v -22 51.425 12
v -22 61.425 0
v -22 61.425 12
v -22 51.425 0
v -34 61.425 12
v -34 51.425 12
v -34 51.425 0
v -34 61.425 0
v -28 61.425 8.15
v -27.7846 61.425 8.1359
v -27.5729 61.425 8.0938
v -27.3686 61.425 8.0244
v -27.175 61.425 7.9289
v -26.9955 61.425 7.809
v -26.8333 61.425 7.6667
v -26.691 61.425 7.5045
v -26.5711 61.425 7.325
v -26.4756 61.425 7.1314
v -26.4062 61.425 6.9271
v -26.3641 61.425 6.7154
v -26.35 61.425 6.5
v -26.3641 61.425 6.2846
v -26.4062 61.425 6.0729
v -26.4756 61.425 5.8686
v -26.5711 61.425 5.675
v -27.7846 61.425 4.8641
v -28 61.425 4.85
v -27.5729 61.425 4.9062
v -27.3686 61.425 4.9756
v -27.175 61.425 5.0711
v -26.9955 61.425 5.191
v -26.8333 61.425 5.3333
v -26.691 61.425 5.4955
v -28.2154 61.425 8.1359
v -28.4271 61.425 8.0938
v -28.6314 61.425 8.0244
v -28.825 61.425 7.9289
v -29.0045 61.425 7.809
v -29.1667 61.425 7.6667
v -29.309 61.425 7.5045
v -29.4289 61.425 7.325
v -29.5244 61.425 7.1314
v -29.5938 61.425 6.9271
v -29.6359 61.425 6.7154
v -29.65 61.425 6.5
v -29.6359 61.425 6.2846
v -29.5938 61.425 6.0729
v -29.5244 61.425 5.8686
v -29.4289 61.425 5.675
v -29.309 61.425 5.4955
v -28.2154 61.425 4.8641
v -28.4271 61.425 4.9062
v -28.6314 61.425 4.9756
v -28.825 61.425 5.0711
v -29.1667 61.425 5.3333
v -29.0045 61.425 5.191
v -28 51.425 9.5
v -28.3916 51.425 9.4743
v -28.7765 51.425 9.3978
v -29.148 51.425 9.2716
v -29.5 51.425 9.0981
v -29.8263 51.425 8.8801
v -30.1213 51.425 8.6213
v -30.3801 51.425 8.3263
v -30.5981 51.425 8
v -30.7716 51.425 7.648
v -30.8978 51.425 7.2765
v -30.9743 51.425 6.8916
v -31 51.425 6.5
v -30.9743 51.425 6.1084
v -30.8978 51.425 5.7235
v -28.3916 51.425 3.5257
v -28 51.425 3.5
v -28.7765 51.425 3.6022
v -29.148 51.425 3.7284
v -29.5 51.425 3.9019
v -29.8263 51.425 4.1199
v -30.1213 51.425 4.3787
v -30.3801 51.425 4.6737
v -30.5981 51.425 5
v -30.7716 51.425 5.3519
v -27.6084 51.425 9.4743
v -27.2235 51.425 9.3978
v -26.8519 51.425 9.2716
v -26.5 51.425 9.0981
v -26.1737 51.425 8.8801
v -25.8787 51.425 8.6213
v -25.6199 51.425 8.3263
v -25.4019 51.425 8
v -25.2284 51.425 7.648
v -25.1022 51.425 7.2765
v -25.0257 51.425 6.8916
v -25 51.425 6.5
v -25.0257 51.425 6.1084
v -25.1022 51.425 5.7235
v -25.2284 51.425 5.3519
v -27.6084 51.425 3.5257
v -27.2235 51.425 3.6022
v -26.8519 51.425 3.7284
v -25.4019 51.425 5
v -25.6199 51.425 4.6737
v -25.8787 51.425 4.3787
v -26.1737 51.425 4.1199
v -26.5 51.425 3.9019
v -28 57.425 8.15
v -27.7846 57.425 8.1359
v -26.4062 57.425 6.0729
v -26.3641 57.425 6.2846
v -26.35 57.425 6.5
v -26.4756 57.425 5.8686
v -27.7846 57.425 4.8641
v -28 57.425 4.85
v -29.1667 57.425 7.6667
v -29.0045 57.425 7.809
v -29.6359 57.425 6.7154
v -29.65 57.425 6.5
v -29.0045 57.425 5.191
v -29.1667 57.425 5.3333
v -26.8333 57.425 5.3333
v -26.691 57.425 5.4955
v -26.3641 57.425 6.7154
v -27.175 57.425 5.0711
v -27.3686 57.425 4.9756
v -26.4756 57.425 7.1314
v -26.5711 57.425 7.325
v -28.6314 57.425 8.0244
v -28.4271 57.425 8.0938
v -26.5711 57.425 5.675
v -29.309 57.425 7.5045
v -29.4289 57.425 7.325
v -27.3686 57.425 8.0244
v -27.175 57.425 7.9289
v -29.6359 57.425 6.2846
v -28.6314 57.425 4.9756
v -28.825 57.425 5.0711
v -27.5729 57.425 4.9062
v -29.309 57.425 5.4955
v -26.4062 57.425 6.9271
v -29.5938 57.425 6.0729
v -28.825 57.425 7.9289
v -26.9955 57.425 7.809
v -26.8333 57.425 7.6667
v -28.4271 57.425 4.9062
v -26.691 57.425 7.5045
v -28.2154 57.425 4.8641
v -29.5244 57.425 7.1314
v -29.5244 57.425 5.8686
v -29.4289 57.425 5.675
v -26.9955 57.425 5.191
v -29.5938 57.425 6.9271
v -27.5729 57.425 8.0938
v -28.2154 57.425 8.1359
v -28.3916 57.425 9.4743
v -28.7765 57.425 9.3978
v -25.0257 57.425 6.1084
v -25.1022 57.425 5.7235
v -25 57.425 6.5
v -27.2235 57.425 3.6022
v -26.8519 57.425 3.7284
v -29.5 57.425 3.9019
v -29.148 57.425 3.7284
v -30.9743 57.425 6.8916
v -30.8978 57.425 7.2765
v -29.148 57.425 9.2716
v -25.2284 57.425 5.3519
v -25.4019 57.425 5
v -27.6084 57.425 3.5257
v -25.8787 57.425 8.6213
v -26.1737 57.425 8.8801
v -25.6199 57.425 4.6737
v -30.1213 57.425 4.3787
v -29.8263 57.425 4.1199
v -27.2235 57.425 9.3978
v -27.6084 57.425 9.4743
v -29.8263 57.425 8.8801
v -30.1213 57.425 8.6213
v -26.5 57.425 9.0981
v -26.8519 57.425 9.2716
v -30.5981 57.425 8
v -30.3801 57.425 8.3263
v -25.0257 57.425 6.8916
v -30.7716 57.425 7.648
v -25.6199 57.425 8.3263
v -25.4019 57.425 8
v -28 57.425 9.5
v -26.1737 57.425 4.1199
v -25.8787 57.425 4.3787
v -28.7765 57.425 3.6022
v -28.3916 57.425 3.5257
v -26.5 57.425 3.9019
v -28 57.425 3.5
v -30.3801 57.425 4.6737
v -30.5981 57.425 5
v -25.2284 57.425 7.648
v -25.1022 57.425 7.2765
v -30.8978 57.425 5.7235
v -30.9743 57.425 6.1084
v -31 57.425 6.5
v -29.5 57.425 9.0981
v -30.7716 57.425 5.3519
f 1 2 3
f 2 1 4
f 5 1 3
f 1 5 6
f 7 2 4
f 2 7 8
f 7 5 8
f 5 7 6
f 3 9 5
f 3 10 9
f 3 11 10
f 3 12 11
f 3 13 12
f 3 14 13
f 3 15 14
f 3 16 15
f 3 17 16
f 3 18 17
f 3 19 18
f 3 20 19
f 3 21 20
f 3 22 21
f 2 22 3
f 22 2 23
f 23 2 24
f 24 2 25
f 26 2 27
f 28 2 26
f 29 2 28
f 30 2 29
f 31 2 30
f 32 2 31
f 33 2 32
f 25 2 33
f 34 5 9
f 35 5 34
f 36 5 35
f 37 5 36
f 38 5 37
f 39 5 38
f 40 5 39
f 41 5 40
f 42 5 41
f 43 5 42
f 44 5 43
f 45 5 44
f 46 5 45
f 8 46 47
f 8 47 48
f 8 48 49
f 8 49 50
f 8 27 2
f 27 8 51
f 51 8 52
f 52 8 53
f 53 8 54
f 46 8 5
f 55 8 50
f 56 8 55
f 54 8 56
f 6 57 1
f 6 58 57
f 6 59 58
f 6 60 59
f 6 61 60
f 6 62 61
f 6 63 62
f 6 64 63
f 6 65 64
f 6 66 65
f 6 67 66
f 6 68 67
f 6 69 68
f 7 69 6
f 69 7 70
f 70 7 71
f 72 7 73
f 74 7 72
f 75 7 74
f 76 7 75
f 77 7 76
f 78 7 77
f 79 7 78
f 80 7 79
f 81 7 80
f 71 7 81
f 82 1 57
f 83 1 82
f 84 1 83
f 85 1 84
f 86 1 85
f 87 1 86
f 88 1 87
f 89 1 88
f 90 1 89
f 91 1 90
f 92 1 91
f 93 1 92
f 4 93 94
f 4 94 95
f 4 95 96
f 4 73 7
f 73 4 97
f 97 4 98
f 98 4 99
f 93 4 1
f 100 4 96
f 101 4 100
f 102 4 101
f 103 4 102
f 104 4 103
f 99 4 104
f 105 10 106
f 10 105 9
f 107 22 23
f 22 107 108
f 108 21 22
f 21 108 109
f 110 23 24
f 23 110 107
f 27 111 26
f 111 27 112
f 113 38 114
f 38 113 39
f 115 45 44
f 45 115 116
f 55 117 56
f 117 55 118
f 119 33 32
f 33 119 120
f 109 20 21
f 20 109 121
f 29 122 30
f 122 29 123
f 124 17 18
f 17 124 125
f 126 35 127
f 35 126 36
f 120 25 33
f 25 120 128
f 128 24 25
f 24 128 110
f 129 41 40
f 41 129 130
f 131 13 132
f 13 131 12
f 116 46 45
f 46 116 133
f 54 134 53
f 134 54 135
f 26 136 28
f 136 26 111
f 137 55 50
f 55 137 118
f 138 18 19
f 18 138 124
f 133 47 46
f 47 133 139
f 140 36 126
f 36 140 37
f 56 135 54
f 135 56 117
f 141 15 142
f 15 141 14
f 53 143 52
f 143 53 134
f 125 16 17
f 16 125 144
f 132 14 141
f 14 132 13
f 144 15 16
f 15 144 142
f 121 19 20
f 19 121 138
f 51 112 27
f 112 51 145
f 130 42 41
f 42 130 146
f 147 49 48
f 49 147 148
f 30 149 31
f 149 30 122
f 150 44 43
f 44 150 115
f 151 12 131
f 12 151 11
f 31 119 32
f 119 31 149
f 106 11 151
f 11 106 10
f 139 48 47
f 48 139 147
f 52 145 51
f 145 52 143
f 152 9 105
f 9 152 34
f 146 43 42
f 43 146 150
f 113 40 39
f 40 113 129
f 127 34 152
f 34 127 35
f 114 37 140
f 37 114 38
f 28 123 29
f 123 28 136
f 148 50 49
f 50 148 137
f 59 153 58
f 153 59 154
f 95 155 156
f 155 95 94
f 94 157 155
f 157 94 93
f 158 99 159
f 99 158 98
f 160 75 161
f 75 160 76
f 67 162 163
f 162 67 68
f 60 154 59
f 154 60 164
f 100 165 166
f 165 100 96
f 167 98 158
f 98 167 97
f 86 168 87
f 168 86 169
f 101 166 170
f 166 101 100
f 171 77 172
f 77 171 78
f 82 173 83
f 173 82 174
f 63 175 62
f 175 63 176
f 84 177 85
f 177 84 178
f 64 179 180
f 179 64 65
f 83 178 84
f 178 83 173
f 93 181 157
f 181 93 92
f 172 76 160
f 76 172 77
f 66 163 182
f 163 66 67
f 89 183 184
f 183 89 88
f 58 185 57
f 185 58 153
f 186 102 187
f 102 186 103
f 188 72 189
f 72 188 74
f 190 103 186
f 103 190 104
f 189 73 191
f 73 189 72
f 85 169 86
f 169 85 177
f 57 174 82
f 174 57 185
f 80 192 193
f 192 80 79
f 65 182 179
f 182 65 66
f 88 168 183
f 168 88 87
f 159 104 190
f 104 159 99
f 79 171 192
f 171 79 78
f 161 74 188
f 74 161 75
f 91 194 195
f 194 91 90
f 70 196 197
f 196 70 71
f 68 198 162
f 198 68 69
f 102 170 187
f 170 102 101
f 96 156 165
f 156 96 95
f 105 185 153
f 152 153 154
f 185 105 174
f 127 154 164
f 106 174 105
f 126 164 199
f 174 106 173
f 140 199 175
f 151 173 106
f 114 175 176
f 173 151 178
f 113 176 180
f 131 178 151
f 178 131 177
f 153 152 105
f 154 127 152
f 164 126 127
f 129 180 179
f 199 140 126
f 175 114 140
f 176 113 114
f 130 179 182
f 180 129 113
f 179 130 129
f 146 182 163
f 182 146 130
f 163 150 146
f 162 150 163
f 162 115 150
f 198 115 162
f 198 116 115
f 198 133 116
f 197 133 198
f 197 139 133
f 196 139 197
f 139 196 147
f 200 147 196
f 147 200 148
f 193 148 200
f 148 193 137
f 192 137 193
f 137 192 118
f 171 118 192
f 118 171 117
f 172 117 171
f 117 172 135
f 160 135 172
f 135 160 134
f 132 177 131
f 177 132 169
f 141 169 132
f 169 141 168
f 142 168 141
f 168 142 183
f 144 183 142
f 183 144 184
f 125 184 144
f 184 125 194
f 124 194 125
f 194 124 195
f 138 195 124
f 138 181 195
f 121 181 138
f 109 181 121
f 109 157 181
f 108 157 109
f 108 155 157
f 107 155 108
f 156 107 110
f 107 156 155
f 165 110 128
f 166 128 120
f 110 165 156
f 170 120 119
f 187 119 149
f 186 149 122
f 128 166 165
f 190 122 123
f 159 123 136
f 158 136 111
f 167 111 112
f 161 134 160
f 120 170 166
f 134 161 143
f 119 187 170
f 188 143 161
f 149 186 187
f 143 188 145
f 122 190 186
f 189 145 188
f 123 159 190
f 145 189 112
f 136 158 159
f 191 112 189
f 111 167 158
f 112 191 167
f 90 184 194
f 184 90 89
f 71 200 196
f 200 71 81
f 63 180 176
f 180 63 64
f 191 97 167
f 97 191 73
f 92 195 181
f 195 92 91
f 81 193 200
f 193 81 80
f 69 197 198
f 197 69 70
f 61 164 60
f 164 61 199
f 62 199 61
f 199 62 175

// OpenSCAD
// file: common.scad
// Small helpers shared by the part files. Include after params.scad.

// An axis-aligned box given by its extents, as task.py's _mm(x0, x1, y0, y1, z0, z1) does.
module box(x0, x1, y0, y1, z0, z1) {
    translate([x0, y0, z0]) cube([x1 - x0, y1 - y0, z1 - z0]);
}

// A round hole or rod along +y from y0 to y1, its axis at (x, z).
module ybore(x, y0, y1, z, d) {
    translate([x, y0, z]) rotate([-90, 0, 0]) cylinder(d = d, h = y1 - y0);
}
// file: params.scad
// Shared dimensions for the printed carrier, sprung rail, guide-rod mounts and SSD dummy (all in mm, grams, N/mm).
//
// Every line is either
//   NAME = value; // task.py: <expression>   a number taken from task.py; check_params.py evaluates <expression>
//                                            against the imported task module (box(BOXES, i) gives a box's
//                                            [x0, x1, y0, y1, z0, z1] in mm) and asserts it equals value
//   NAME = value; // fab: <reason>           a fabrication choice (fit, hardware size); check_params.py checks
//                                            that these are consistent with the task numbers
// Keep one assignment per line and use only numbers, + - * /, names and [ ] lists: check_params.py parses this file.
//
// Frames, as in task.py:
//   carrier: origin on the table under the carrier's centre; x along the carrier, handle bezel toward -x, the drive's
//            connector end (rear) at +x; y across, the sprung rail at +y, the fixed rail at -y; z up.
//   SSD:     origin under the drive's centre on its bottom face; x along it, connector end toward +x; z up.

// ---- the SSD (task.py "the SSD, in its own frame") -----------------------------------------------------------------
SSD_L = 100; // task.py: SSD_L * 1000
SSD_W = 69.85; // task.py: SSD_W * 1000
SSD_H = 7; // task.py: SSD_H * 1000
SSD_MASS_G = 55; // task.py: SSD_MASS * 1000
HALF_W = 34.925; // task.py: HALF_W
HOLE_X = [-36.0, 40.6]; // task.py: HOLE_X
HOLE_Z = 3; // task.py: HOLE_Z
HOLE = 4; // task.py: HOLE
HOLE_DEPTH = 3; // task.py: HOLE_DEPTH
CONN_X = [44, 50]; // task.py: box(SSD_BOXES, 1)[0:2]
CONN_Y = [-31.925, 0]; // task.py: box(SSD_BOXES, 1)[2:4]
LABEL_X = [-42, 30]; // task.py: box(SSD_BOXES, 3)[0:2]
LABEL_Y = [-26, 26]; // task.py: box(SSD_BOXES, 3)[2:4]

// ---- the carrier (task.py "the carrier, in its own frame") ---------------------------------------------------------
CAR_L = 140; // task.py: CAR_L * 1000
CAR_W = 76; // task.py: CAR_W * 1000
CAR_H = 15; // task.py: CAR_H * 1000
CAR_MASS_G = 200; // task.py: CAR_MASS * 1000
SEAT_X = 20; // task.py: SX
SEAT_Z = 4; // task.py: SZ
GAP = 0.5; // task.py: GAP
PIN = 2.5; // task.py: PIN
PIN_IN = 2; // task.py: PIN_IN
RAIL_T = 3; // task.py: RAIL_T
RAIL_IN = 35.425; // task.py: RAIL_IN
RAIL_OUT = 38.425; // task.py: RAIL_OUT
PIN_X = [-16.0, 60.6]; // task.py: PIN_X
PIN_Z = 7; // task.py: PIN_Z
RAIL_SEGS = [[-61, -4], [48, 70]]; // task.py: RAIL_SEGS
RIB_X = [[-25, -10], [50, 65]]; // task.py: RIB_X
RIB_Y_END = 33; // task.py: box(CARRIER_BOXES, 3)[3]
BEZEL_X = [-70, -62]; // task.py: box(CARRIER_BOXES, 0)[0:2]
BEZEL_Y = 38; // task.py: box(CARRIER_BOXES, 0)[3]
HANDLE_X = [-74, -70]; // task.py: box(CARRIER_BOXES, 1)[0:2]
HANDLE_Y = 25; // task.py: box(CARRIER_BOXES, 1)[3]
HANDLE_Z = [3, 12]; // task.py: box(CARRIER_BOXES, 1)[4:6]
FLOOR_X = [-62, -34]; // task.py: box(CARRIER_BOXES, 2)[0:2]
FLOOR_Y = 33; // task.py: box(CARRIER_BOXES, 2)[3]
FLOOR_H = 3; // task.py: box(CARRIER_BOXES, 2)[5]
FIXED_BAR_X = [-70, 70]; // task.py: box(CARRIER_BOXES, 5)[0:2]
FIXED_BAR_H = 3; // task.py: box(CARRIER_BOXES, 5)[5]
FIXED_SEG0_X0 = -62; // task.py: box(CARRIER_BOXES, 6)[0]
RAIL_H = 12; // task.py: box(CARRIER_BOXES, 6)[5]

// ---- the sprung rail (task.py _latch_rail) -------------------------------------------------------------------------
RAIL_Z0 = 1; // task.py: box(rail.boxes, 0)[4]
RAIL_BAR_X = [-61, 70]; // task.py: box(rail.boxes, 2)[0:2]
RAIL_BAR_H = 3; // task.py: box(rail.boxes, 2)[5]
RAIL_TRAVEL = 7; // task.py: RAIL_TRAVEL * 1000
RAIL_RATE = 0.15; // task.py: RAIL_RATE / 1000
RAIL_MASS_G = 30; // task.py: rail.mass * 1000
TAB_X = [-61, -49]; // task.py: TAB_X
TAB_Y = [46.425, 48.925]; // task.py: TAB_Y
TAB_Z = [8, 34]; // task.py: TAB_Z
BRACKET_Z = [8, 12]; // task.py: box(rail.boxes, 3)[4:6]

// ---- print fits (fabrication choices) ------------------------------------------------------------------------------
SLIDE_CLR = 0.3; // fab: diametral clearance of a sliding fit (rod in its mount bore), and the rail's floor clearance
PRESS_CLR = 0; // fab: printed at nominal size for a press fit; horizontal printed holes come out slightly small
POCKET_CLR = 0.3; // fab: clearance round ballast plates and bars in their pockets
$fn = 48; // fab: facets on round holes

// ---- hardware (fabrication choices) --------------------------------------------------------------------------------
PIN_D = 2.5; // fab: 2.5 mm steel dowel pin, as wide as the task's 2.5 mm square pins (0.75 mm clear in a 4 mm hole)
PIN_L = 6; // fab: dowel pin length; PIN_IN + GAP stands proud of the rail, the rest is pressed in
PIN_BOSS = PIN_L - PIN_IN - GAP - RAIL_T; // fab: 0.5 mm pad on the rail's outer face so the pin sits flush there
ROD_D = 3; // fab: 3 mm ground steel rod (silver steel / drill rod / 3 mm linear shaft)
ROD_X = [-28, 52]; // fab: the two guide rods, one in each rail segment, clear of the pins and the pull tab
ROD_Z = 6.5; // fab: rod axis height, mid-height of the rail
BOSS_W = 8; // fab: width (along x) of the rod boss on the sprung rail's outer face
BOSS_L = 6; // fab: how far the rod boss stands out from the rail's outer face
ROD_EMBED = 8; // fab: depth of the blind press-fit bore for the rod in the rail and its boss
MOUNT_W = 12; // fab: guide-rod mount width along x
MOUNT_T = 10; // fab: guide-rod mount length along the rod (the sliding bore's length)
MOUNT_H = 12; // fab: guide-rod mount height
MOUNT_Y0 = RAIL_OUT + BOSS_L + RAIL_TRAVEL; // fab: the boss meets the mount's inner face at full travel (hard stop)
MOUNT_Y1 = MOUNT_Y0 + MOUNT_T; // fab: the mount's outer face
ROD_PROUD = 1; // fab: the rod stands 1 mm out of the mount's outer face with the rail closed
ROD_L = ROD_EMBED + RAIL_TRAVEL + MOUNT_T + ROD_PROUD; // fab: cut length of each guide rod (26 mm)
TONGUE_W = 20; // fab: width of the base web that carries each mount
N_SPRINGS = 2; // fab: one compression spring over each guide rod
SPRING_WIRE = 0.3; // fab: music (spring steel) wire diameter
SPRING_OD = 5; // fab: spring outside diameter (inside 4.4 mm, clear of the 3 mm rod)
SPRING_ACTIVE = 10; // fab: active coils; closed and ground ends add one dead coil at each end
SPRING_POCKET = 6; // fab: depth of the spring pocket in the mount; the spring's length at full travel
SPRING_PRELOAD = 0.5; // fab: compression already in each spring with the rail closed
SPRING_FREE = SPRING_POCKET + RAIL_TRAVEL + SPRING_PRELOAD; // fab: free length (13.5 mm)
SPRING_RATE = RAIL_RATE / N_SPRINGS; // fab: rate of each spring, 0.075 N/mm, so the pair matches the task's 150 N/m
SPRING_POCKET_D = SPRING_OD + 1; // fab: spring pocket diameter

// ---- the real fixture's floor and ballast (fabrication choices) ----------------------------------------------------
BASE_T = RAIL_Z0 - SLIDE_CLR; // fab: 0.7 mm base web under the whole carrier and the sprung rail, below the rail
STOP_H = 3; // fab: rib extensions up to y = RAIL_IN are the sprung rail's closed stop; they stay below the drive (4)
SLAB_X = [-10, 50]; // fab: ballast slab between the ribs, under the drive
SLAB_Y = 30; // fab: slab half-width (the fingers' room beside the drive is left open)
SLAB_H = 3.5; // fab: slab top, 0.5 mm below the seated drive's bottom face
SLAB_POCKET = [55, 55, 3]; // fab: steel ballast plate, 55 x 55 x 3 mm, set in from the top
BEZEL_POCKET = [6, 70, 12]; // fab: steel flat bar 6 x 12 mm, 70 mm long, set in the bezel from below
FLOOR_POCKET = [24, 60, 2]; // fab: steel plate 24 x 60 x 2 mm, set in the front floor plate from below
// main file
// Guide-rod mount: the fixed block that each guide rod slides through, with a pocket for the rod's spring.
// It is printed as part of the carrier frame (carrier_frame.scad places two of them on base tongues outboard of the
// sprung rail), so the bore lines up with the rail's rod boss without any adjustment. Opening this file on its own
// shows one mount, in the carrier frame, at the first rod position.
//
// The rod is pressed into the sprung rail and slides in this mount's bore (ROD_D + SLIDE_CLR). The spring sits over
// the rod between the rail's boss and the bottom of the pocket; it pushes the rail closed. With the rail fully open
// the boss meets the mount's inner face: that is the 7 mm travel stop.

include <params.scad>
include <common.scad>

module guide_rod_mount(x) {
    difference() {
        box(x - MOUNT_W / 2, x + MOUNT_W / 2, MOUNT_Y0, MOUNT_Y1, 0, MOUNT_H);
        // sliding bore for the guide rod, right through
        ybore(x, MOUNT_Y0 - 1, MOUNT_Y1 + 1, ROD_Z, ROD_D + SLIDE_CLR);
        // spring pocket, open toward the rail
        ybore(x, MOUNT_Y0 - 1, MOUNT_Y0 + SPRING_POCKET, ROD_Z, SPRING_POCKET_D);
    }
}

guide_rod_mount(ROD_X[0]);
